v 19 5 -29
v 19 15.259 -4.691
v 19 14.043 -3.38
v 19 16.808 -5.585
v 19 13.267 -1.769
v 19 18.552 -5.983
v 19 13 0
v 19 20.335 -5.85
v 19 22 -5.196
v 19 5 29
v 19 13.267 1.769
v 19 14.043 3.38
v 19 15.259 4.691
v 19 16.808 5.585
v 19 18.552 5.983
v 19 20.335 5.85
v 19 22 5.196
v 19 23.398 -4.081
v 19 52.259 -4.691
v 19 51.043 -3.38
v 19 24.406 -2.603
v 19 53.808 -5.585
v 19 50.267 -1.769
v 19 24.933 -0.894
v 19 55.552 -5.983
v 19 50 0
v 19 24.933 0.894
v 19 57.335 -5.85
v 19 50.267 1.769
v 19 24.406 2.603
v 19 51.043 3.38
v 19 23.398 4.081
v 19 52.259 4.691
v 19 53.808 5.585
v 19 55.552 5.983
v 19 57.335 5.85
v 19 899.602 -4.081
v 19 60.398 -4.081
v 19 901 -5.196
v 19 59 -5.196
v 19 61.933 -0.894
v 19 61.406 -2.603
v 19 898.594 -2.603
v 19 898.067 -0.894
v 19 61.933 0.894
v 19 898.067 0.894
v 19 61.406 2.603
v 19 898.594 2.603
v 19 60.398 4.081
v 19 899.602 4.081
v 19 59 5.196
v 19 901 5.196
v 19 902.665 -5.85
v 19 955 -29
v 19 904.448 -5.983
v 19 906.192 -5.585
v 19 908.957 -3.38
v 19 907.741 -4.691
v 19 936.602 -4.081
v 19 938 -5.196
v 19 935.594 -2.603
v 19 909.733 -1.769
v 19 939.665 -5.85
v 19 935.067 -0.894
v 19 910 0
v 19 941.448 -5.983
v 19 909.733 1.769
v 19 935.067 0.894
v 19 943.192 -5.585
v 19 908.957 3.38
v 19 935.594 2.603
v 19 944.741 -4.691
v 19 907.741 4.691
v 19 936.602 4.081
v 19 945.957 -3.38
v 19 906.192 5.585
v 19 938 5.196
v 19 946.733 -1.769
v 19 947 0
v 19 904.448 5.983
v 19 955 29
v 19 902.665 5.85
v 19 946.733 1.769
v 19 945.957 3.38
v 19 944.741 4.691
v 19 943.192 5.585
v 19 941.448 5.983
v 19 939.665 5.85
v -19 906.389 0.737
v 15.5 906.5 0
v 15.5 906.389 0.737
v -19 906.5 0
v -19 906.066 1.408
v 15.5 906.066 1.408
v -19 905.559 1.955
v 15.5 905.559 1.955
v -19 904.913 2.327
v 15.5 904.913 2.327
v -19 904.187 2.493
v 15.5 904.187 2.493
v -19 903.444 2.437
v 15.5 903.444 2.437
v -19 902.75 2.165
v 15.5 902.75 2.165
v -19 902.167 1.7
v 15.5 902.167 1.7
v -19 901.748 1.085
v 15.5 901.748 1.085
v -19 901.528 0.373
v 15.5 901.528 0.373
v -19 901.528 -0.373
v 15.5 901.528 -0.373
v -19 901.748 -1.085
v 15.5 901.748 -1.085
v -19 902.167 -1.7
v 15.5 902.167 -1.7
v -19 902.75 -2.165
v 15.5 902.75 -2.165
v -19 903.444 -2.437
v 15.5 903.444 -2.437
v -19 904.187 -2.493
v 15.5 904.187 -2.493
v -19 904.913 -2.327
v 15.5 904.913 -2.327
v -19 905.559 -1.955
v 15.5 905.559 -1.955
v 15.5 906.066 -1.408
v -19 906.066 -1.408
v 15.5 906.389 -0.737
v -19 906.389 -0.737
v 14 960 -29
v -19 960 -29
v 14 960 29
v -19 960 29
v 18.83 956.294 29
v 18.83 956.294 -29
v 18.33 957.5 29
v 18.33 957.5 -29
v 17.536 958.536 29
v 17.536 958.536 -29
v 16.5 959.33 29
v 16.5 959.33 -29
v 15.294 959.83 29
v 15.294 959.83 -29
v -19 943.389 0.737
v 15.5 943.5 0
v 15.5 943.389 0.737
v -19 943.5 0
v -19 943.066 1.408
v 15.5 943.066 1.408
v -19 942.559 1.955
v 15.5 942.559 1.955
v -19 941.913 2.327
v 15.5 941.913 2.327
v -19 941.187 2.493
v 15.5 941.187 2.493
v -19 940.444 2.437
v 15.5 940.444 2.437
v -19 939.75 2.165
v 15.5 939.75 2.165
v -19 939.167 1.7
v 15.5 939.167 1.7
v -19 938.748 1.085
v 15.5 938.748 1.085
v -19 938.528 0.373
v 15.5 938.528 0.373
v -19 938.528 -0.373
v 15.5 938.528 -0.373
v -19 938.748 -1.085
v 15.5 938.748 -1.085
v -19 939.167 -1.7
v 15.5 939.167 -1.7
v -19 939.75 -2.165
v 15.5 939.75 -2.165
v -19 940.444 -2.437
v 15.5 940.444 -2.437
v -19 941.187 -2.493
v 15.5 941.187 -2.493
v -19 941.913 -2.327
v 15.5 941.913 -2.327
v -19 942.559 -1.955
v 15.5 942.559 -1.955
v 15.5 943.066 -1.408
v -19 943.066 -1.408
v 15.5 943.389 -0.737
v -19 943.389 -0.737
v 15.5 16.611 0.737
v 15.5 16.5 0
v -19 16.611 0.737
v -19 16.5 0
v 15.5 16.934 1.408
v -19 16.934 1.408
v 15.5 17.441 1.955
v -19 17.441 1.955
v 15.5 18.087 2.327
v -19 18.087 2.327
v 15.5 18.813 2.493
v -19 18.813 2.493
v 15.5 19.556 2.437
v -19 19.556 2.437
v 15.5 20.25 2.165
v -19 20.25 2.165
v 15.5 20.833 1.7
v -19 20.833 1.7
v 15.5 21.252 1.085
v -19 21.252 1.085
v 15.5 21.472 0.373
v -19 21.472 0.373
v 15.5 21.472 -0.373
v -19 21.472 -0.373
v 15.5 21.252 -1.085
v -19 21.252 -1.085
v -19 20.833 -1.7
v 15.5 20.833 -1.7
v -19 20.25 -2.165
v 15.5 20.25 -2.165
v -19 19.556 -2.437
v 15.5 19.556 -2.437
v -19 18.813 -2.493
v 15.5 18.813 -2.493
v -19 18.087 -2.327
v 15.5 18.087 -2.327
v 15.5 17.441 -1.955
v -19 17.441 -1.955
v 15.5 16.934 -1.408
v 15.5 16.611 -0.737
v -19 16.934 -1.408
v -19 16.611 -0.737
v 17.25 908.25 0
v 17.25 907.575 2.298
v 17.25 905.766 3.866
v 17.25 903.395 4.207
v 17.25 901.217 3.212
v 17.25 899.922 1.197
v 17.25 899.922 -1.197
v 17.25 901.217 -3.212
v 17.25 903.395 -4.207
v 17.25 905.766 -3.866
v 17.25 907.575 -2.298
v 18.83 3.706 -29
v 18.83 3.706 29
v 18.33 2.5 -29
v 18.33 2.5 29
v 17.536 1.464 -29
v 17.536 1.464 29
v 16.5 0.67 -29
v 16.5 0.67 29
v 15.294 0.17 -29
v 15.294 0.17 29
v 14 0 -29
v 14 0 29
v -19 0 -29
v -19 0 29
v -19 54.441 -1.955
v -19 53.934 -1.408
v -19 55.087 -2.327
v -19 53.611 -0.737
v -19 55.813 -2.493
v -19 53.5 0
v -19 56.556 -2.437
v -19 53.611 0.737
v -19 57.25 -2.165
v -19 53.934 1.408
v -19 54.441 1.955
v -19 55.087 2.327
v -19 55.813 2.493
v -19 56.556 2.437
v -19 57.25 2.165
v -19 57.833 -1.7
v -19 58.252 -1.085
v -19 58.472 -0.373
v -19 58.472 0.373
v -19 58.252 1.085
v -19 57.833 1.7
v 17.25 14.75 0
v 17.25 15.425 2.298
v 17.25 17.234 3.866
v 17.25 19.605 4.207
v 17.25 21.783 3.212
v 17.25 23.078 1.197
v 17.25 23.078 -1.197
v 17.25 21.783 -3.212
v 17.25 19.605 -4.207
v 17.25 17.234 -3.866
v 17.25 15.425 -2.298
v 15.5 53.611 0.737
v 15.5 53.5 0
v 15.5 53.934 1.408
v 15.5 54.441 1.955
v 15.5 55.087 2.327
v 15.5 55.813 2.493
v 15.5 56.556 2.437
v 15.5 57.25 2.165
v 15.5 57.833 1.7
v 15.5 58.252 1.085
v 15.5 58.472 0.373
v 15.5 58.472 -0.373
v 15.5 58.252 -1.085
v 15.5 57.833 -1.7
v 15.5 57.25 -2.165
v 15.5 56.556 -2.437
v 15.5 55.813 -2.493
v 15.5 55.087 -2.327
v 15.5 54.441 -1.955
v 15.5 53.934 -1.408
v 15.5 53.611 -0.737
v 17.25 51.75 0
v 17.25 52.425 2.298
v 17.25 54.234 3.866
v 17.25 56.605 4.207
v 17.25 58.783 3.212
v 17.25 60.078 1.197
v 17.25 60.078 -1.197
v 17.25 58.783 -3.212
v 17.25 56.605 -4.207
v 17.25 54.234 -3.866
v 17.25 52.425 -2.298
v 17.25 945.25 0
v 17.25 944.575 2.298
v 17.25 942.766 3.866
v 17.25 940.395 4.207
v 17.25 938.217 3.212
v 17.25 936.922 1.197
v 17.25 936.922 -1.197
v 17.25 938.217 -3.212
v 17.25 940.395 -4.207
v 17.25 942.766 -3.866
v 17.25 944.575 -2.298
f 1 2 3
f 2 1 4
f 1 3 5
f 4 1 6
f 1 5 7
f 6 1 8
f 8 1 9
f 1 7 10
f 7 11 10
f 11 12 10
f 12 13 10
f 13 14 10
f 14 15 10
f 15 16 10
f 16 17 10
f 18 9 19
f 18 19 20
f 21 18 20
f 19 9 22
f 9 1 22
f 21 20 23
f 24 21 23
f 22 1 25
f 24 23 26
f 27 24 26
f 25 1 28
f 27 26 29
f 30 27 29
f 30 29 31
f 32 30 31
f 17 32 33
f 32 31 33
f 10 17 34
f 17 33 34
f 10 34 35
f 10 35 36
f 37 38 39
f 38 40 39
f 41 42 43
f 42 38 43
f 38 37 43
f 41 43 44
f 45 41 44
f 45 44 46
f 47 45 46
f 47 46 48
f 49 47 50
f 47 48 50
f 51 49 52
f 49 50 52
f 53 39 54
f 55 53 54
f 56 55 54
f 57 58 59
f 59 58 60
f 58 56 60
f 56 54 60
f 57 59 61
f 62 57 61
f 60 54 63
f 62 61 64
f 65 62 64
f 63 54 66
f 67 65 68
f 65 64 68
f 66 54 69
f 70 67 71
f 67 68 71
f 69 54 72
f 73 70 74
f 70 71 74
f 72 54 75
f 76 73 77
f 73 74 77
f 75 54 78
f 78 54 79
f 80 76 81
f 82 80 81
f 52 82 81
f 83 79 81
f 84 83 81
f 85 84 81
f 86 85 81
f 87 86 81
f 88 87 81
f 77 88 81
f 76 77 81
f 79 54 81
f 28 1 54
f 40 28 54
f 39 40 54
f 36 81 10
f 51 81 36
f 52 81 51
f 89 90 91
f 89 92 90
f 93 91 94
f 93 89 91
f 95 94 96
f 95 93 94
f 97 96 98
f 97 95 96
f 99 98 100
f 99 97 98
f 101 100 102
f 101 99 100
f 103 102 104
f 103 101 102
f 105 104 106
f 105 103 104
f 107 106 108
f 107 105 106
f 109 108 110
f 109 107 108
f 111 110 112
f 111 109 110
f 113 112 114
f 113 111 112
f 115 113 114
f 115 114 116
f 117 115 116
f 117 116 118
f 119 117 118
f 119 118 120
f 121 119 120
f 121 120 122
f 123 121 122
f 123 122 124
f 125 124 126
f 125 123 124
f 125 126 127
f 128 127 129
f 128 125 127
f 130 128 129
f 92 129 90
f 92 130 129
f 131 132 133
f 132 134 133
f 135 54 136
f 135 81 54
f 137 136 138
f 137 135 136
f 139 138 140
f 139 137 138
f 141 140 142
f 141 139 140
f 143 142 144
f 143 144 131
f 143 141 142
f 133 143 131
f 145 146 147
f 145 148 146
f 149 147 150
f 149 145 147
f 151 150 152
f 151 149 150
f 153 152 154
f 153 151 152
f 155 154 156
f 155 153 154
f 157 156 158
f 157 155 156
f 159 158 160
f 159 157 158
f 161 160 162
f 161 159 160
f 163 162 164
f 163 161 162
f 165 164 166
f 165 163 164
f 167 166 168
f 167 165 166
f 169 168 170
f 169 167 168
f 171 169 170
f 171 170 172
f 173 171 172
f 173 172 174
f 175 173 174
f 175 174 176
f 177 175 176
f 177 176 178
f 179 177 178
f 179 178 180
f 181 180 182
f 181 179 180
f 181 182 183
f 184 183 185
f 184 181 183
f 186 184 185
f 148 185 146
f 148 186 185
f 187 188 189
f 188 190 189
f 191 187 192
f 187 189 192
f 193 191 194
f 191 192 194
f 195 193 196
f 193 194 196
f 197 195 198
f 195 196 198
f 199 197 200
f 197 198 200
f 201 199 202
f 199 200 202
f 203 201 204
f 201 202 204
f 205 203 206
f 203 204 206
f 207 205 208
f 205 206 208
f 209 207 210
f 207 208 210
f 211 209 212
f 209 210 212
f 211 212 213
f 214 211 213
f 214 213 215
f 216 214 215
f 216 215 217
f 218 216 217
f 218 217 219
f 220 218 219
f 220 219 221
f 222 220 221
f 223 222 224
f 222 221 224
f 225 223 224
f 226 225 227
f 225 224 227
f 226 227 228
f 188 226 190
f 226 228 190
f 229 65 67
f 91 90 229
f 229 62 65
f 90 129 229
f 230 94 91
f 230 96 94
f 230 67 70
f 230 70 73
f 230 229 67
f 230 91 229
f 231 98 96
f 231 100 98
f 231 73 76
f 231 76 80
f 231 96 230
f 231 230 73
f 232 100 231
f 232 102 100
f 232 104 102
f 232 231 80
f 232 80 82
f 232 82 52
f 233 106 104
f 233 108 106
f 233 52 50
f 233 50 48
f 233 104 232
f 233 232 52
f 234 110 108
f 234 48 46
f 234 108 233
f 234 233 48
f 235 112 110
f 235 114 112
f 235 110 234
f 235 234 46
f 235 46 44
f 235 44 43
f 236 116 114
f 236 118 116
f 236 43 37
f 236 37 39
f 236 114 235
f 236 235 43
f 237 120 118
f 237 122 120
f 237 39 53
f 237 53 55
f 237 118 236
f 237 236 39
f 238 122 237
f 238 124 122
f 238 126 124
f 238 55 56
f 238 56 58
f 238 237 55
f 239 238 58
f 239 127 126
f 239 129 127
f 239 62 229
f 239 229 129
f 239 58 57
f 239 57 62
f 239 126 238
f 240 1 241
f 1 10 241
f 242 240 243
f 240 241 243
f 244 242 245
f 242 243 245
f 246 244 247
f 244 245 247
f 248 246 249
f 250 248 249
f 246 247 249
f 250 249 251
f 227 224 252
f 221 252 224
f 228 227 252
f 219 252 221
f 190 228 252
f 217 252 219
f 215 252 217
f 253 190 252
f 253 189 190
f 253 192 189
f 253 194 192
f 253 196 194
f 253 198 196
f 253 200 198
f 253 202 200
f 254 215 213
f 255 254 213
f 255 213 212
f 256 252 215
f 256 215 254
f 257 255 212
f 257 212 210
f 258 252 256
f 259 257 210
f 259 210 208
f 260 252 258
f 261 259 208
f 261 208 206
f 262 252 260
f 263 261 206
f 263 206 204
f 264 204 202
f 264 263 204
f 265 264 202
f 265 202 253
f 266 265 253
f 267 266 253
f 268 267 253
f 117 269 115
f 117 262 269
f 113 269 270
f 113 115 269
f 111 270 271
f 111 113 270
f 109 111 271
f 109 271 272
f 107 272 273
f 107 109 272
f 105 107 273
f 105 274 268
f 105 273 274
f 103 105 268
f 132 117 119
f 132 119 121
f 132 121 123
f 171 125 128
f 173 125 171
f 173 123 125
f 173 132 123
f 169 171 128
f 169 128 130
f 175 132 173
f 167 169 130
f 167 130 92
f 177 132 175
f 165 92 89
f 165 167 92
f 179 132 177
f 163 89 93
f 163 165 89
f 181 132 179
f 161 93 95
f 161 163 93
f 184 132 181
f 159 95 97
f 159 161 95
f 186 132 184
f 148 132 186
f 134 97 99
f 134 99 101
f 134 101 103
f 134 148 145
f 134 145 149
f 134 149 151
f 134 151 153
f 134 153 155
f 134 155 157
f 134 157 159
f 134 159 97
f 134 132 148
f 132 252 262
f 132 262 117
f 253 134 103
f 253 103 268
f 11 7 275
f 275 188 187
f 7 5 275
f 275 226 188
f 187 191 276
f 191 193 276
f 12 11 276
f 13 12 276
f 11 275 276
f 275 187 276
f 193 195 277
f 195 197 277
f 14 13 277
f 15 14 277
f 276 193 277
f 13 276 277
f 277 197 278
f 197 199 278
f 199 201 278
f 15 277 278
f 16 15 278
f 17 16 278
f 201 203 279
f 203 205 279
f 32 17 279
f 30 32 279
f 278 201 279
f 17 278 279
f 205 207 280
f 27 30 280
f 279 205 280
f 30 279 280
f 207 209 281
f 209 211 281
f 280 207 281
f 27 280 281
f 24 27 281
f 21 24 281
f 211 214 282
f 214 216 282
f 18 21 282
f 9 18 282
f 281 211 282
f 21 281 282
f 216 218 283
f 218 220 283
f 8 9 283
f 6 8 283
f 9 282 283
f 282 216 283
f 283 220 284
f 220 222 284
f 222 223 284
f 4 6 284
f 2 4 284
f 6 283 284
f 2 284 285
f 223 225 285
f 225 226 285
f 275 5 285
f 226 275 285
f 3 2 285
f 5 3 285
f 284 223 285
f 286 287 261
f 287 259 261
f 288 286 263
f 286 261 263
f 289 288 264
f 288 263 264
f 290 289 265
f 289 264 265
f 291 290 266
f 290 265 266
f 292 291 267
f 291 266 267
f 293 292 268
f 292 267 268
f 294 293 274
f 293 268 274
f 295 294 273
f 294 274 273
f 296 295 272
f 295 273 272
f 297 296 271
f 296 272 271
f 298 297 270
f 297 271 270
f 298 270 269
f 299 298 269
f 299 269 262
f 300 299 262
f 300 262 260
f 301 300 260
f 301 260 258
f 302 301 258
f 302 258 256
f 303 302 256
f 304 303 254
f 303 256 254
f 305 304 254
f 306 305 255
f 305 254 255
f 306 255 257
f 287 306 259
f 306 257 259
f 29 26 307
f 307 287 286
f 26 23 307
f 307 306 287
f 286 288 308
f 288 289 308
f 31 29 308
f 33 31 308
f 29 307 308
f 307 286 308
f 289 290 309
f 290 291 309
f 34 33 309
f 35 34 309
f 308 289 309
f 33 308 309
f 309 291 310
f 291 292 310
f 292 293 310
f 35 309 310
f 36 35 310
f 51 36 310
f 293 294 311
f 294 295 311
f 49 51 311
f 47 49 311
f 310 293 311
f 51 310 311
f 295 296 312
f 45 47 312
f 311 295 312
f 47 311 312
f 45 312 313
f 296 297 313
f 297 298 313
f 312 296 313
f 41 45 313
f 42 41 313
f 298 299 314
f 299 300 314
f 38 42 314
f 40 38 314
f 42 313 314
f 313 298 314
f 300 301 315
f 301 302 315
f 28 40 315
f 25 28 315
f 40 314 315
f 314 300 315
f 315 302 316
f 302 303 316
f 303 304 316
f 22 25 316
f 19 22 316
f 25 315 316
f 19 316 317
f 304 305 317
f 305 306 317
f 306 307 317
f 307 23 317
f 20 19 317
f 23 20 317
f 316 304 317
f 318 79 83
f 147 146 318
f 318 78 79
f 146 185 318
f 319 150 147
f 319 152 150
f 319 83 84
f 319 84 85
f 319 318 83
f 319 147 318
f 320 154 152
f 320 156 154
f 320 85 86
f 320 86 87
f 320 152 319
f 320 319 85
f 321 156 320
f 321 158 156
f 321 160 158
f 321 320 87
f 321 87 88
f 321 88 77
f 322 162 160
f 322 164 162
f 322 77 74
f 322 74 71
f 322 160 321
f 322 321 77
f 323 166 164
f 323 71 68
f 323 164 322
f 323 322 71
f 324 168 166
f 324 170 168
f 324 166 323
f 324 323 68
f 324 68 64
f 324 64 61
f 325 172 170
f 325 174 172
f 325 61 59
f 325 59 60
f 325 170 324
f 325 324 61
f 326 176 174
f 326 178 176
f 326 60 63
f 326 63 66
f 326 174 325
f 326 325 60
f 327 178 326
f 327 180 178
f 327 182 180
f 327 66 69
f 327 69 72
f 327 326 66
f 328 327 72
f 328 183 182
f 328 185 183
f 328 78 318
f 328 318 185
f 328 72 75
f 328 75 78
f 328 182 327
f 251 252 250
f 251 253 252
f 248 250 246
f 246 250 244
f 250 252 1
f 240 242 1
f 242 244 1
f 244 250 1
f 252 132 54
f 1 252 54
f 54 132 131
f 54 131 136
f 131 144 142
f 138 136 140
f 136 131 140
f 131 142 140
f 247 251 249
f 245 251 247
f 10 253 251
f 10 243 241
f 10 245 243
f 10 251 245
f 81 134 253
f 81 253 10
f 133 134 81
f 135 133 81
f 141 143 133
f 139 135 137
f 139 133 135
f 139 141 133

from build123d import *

# Parameters (mm, degrees)
F0_W           = 38
F0_H           = 58
F1_DEPTH       = 480
F3_R           = 5
F4_D           = 5
F4_CSINK_D     = 12
F4_CSINK_ANGLE = 90


with BuildPart() as f1:
    # F0 (on Front) → F1 (new body)
    with BuildSketch(Plane.XZ):
        Rectangle(F0_W, F0_H)
    extrude(amount=-F1_DEPTH)

    # F3
    f3_edges = [f1.edges().sort_by_distance(p)[0] for p in [
        (19, 0, 0),
    ]]
    fillet(f3_edges, radius=F3_R)

    # F4 (through all)
    with Locations(Plane.YZ.offset(19)):
        with Locations((19, 0), (56, 0)):
            CounterSinkHole(F4_D / 2, F4_CSINK_D / 2, counter_sink_angle=F4_CSINK_ANGLE)

    # F5: F1 across face


with BuildPart() as f1_1:
    add(f1.part)
    add(f1.part.mirror(Plane(origin=(0, 480, 0), x_dir=(1, 0, 0), z_dir=(0, 1, 0))))


solid = f1_1.part
